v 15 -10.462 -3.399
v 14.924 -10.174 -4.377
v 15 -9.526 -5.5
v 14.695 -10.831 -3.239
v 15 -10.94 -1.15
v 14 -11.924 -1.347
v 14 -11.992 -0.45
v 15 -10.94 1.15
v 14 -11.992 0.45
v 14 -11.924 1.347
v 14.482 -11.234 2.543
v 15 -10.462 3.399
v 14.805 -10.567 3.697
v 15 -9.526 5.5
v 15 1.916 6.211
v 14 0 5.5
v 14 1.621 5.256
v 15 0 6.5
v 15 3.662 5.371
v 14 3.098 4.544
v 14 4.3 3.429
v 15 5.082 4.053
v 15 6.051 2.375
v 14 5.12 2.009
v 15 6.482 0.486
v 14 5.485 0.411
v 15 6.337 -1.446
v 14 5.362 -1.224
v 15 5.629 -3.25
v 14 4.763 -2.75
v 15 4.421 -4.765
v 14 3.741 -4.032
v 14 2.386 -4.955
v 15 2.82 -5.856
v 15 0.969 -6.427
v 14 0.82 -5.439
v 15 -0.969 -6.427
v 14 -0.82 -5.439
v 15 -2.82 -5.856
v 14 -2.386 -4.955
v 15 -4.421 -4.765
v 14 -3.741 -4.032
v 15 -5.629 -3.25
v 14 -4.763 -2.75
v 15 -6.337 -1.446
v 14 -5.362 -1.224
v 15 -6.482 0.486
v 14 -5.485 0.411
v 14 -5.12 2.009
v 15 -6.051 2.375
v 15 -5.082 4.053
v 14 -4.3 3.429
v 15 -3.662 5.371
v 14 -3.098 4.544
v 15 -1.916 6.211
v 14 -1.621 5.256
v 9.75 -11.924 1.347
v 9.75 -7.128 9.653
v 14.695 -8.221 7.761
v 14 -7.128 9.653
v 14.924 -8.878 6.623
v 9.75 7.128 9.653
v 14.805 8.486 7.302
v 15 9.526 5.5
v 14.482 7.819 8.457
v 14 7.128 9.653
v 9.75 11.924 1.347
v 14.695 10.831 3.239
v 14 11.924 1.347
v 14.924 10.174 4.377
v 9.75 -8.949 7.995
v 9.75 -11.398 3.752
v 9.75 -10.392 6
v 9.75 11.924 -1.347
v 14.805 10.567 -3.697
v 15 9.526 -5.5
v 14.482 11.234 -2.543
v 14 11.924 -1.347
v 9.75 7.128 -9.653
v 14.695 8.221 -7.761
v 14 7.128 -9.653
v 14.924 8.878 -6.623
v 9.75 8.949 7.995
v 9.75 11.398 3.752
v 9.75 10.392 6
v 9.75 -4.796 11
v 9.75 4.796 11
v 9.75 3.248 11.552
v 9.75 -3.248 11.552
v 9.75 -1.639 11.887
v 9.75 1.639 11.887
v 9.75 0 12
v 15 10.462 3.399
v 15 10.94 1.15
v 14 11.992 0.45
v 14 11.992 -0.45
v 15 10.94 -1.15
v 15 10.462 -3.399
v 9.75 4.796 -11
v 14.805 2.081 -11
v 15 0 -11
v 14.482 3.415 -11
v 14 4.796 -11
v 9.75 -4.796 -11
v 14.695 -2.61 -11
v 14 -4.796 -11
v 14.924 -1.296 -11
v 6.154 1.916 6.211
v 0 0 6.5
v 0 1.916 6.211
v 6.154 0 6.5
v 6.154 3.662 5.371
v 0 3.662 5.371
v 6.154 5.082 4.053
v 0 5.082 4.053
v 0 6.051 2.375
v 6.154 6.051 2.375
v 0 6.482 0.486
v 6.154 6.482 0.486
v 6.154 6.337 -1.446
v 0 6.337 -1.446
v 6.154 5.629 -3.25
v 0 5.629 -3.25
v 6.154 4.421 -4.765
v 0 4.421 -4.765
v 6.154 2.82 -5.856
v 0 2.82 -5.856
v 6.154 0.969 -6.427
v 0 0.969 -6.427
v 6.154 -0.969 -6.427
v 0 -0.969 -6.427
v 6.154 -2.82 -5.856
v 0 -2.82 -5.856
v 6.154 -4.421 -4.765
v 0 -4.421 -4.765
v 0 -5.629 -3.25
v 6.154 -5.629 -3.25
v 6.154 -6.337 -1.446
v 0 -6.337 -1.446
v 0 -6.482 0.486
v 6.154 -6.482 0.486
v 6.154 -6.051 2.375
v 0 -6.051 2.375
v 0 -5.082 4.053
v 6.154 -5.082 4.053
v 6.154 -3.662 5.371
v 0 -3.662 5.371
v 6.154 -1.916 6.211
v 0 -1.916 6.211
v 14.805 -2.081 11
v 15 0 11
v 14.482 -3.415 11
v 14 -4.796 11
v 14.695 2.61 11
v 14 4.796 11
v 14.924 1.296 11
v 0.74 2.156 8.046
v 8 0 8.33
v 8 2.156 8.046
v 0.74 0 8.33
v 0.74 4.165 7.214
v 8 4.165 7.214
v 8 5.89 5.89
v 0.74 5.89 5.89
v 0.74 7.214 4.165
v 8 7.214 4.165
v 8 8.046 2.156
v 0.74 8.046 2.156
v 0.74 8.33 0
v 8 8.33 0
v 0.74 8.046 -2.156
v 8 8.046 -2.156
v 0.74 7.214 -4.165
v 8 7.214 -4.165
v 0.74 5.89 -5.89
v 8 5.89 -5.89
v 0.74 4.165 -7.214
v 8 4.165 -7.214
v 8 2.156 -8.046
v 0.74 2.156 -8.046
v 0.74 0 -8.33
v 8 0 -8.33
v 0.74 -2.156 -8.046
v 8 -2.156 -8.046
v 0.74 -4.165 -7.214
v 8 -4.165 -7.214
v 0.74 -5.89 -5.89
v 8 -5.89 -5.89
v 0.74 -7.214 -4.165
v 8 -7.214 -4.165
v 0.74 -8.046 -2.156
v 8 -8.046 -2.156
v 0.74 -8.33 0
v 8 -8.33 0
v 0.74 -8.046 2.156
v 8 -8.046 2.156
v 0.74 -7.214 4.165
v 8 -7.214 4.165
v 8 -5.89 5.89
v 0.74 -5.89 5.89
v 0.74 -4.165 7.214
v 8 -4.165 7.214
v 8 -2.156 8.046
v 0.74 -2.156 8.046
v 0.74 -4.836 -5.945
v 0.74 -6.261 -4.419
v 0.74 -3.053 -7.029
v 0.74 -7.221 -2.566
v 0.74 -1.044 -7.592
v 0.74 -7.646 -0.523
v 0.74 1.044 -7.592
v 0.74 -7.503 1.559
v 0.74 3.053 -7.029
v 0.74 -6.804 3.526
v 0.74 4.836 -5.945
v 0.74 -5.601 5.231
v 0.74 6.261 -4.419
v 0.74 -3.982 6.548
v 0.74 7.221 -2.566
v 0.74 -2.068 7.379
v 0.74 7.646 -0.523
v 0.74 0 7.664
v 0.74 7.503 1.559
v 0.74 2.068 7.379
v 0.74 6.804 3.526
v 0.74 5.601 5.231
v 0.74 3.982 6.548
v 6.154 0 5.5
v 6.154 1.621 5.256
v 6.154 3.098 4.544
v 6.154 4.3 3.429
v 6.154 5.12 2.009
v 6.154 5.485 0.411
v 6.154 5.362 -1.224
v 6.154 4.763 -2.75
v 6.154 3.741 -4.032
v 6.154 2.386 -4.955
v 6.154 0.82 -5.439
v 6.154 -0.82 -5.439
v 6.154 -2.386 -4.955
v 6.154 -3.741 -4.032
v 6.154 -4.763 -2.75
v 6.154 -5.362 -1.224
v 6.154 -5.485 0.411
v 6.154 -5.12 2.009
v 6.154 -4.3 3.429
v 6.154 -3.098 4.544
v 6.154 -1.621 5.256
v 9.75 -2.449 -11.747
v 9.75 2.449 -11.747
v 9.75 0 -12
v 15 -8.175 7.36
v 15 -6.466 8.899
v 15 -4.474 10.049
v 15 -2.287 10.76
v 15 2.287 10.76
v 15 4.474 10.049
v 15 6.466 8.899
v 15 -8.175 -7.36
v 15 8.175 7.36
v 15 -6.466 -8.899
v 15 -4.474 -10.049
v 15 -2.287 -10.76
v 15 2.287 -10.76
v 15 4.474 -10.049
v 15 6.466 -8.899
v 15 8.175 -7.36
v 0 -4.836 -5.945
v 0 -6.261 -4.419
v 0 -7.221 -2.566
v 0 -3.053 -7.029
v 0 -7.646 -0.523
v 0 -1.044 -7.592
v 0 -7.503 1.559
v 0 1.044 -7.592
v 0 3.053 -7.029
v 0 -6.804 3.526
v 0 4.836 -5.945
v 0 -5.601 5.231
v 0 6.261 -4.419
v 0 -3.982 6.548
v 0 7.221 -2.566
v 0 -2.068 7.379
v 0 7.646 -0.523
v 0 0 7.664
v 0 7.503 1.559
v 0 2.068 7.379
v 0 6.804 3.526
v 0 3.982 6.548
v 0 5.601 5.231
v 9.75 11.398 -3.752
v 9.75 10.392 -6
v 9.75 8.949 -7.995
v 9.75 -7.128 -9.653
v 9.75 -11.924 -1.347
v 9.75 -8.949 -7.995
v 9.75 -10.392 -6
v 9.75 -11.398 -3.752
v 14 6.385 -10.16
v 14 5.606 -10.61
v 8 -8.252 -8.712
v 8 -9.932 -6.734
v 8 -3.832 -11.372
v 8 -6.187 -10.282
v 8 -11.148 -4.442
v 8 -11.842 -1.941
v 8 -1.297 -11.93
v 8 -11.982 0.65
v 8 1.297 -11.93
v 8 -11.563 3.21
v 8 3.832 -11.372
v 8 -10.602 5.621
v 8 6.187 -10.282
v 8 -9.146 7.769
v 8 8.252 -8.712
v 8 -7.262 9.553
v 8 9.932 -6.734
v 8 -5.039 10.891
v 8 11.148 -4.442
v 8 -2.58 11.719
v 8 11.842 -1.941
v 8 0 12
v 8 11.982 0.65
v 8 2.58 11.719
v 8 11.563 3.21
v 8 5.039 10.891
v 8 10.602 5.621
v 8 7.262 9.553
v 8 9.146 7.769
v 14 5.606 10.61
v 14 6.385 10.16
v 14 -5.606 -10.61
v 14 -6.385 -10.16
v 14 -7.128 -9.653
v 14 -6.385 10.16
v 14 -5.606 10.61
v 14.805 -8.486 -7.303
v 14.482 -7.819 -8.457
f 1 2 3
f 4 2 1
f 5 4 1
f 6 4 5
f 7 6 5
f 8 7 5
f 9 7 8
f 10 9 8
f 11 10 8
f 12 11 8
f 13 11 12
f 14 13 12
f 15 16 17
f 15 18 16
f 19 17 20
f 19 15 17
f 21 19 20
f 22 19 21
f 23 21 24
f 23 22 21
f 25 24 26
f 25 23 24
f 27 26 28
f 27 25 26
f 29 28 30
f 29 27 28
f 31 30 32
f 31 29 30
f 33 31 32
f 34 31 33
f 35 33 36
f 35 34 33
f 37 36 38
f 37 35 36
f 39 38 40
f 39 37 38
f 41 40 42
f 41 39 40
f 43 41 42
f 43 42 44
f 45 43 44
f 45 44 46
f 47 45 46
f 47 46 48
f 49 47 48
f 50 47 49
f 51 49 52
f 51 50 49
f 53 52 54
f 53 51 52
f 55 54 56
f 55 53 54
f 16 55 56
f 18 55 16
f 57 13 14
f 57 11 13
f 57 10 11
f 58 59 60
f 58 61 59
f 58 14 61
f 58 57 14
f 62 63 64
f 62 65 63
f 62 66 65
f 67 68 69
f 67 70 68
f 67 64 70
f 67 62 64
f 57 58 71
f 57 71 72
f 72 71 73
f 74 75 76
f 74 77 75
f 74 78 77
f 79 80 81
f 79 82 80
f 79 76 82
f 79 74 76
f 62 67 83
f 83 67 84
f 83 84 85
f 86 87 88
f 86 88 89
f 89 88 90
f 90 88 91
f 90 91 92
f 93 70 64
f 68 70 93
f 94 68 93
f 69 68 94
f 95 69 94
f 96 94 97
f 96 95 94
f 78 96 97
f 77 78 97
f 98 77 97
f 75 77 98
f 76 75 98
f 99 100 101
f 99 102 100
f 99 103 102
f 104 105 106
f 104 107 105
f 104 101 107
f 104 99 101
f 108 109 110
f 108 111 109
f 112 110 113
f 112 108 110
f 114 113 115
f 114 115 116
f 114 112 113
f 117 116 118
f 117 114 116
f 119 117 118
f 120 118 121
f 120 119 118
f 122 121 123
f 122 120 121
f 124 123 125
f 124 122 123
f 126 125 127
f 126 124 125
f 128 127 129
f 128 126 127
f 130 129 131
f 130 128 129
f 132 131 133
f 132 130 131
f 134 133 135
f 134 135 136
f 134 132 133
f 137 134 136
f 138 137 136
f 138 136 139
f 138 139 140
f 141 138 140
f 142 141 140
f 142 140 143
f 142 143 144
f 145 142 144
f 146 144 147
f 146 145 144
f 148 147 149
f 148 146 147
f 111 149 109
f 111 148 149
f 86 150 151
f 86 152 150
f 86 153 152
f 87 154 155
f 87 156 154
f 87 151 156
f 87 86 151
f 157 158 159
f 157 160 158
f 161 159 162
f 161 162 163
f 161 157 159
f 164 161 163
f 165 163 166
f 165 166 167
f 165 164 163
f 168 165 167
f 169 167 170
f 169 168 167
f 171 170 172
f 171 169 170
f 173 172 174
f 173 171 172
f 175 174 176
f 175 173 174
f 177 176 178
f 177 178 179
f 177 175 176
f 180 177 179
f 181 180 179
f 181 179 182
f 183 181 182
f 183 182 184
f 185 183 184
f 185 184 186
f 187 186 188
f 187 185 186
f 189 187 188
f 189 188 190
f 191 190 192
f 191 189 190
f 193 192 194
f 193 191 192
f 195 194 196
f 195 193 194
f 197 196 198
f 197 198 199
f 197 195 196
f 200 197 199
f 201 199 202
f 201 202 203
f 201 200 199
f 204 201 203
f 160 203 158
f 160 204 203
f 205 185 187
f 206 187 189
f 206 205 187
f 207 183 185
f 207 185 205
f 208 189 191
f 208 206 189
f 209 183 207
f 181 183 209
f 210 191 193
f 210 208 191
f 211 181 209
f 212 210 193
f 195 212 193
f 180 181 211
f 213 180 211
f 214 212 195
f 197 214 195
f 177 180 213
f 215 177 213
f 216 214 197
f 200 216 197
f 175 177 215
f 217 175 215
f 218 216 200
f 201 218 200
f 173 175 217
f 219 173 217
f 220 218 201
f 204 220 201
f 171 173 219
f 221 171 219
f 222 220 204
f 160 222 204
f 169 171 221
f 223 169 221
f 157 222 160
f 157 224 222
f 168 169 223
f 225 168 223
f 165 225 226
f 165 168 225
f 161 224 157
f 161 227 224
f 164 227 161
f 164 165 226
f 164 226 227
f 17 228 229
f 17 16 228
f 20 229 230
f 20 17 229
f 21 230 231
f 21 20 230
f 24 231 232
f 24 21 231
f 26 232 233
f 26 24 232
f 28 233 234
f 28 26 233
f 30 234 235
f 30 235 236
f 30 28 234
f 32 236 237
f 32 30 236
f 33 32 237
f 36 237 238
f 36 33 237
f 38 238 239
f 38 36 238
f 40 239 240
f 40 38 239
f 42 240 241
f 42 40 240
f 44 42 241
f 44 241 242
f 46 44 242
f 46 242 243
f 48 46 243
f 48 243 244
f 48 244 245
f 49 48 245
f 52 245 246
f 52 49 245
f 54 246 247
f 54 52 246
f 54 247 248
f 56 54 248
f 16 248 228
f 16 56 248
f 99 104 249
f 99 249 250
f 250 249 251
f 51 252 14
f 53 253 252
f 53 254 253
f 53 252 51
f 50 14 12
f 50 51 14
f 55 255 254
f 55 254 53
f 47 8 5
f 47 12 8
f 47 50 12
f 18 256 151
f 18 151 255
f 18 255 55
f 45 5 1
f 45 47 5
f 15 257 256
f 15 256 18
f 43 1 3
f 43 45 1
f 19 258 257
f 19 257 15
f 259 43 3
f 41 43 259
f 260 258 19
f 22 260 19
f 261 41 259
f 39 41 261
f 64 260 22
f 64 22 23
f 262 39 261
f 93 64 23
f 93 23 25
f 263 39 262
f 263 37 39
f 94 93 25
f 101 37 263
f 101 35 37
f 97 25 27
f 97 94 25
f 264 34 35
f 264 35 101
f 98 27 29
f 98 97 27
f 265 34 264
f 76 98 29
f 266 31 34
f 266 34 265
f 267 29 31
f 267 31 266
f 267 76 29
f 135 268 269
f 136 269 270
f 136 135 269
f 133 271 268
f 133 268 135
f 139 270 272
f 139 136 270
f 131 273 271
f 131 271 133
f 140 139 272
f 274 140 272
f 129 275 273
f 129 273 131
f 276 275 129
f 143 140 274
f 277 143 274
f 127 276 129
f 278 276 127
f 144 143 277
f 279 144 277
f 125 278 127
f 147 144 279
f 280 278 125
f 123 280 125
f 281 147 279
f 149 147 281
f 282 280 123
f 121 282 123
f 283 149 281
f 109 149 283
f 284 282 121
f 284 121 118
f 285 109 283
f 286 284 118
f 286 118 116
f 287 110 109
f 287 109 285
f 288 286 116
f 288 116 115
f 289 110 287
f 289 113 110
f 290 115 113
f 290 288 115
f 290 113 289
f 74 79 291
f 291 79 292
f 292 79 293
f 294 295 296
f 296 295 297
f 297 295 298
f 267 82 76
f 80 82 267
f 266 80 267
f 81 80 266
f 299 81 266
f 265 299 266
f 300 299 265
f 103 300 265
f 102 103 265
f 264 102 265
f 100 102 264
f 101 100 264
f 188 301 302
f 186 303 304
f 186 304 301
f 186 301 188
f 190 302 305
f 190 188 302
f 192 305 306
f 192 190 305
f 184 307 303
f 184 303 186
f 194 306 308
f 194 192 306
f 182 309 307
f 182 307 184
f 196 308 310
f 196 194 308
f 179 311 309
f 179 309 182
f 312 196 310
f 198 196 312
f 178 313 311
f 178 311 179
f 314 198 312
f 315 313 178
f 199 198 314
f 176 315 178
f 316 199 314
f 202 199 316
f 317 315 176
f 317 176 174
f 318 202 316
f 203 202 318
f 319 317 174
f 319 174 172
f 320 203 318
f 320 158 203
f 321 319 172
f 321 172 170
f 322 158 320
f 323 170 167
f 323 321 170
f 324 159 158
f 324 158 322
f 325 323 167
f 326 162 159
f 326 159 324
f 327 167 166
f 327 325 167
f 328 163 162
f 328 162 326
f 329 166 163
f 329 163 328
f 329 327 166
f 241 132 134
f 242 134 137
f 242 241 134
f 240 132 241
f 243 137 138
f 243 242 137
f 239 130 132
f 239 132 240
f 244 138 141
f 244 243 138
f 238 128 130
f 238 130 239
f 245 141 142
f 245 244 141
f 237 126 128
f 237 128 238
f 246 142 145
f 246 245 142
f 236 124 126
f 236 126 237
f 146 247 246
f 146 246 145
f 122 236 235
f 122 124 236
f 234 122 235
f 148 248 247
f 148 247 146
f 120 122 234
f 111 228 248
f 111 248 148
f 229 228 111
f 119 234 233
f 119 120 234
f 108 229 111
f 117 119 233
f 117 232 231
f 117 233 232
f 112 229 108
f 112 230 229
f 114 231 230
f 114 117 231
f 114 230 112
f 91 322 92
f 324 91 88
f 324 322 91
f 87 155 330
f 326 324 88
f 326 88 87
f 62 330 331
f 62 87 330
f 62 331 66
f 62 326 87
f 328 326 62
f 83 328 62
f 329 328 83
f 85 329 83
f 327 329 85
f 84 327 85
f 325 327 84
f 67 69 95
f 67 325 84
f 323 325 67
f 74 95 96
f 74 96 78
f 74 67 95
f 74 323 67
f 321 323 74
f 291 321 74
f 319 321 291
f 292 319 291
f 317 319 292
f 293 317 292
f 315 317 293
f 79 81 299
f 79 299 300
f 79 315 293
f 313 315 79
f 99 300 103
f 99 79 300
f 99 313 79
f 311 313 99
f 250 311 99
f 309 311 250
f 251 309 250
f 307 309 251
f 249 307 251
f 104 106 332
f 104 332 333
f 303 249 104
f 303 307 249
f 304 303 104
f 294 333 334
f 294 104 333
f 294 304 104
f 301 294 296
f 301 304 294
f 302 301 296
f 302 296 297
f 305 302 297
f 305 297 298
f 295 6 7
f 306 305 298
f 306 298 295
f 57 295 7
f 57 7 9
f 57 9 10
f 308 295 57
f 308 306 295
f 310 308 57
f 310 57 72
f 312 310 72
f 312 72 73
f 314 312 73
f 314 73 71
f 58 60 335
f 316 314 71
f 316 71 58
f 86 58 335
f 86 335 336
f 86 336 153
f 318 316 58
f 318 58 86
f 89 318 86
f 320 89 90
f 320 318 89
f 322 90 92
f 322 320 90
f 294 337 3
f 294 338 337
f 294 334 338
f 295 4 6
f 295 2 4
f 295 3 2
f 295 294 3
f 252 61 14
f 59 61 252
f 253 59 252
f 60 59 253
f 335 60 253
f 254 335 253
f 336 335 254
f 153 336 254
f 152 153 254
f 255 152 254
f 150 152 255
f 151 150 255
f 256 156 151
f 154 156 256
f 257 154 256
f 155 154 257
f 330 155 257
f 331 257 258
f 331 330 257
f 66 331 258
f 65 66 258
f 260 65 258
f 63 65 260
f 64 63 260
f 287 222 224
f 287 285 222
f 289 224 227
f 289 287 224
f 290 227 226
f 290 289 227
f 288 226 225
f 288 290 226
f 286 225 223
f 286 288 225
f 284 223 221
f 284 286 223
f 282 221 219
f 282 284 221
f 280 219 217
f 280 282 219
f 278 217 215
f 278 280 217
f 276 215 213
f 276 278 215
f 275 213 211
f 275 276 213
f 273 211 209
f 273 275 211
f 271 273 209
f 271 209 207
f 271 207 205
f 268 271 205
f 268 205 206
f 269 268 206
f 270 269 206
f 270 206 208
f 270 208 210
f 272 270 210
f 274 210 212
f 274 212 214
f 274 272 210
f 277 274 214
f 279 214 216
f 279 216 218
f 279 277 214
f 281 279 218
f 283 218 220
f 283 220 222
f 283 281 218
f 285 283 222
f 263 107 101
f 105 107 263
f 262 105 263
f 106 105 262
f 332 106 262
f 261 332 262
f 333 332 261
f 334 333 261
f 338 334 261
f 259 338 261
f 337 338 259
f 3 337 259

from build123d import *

# Parameters (mm, degrees)
TAGLIO_ESTRUSIONE1_DEPTH      = 5.25
TAGLIO_ESTRUSIONE1_DEPTH_BACK = 5.25
TAGLIO_ESTRUSIONE2_DEPTH      = 5.25
TAGLIO_ESTRUSIONE2_DEPTH_BACK = 5.25


with BuildPart() as part:
    # Schizzo1 → Rivoluzione1 (revolve)
    with BuildSketch(Plane.XY):
        Polygon((0, 6.5), (6.153846154, 6.5), (6.153846154, 5.5), (14, 5.5), (15, 6.5), (15, 11), (14, 12), (8, 12), (8, 8.33), (0.740444444, 8.33), (0.740444444, 7.6636), (0, 7.6636), align=None)
    revolve(axis=Axis((15, 0, 0), (-1, 0, 0)))

    # Schizzo2 → Taglio-Estrusione1 (cut, two sides: drawn at the far end of the back side and taken through both)
    with BuildSketch(Plane(origin=(15, 0, 0), x_dir=(0, 0, -1), z_dir=(1, 0, 0)).offset(-TAGLIO_ESTRUSIONE1_DEPTH_BACK)):
        Polygon((-16.5, -9.526279442), (1, -19.629909152), (1, -13.279056191), (-11, -6.350852961), (-11, 6.350852961), (1, 13.279056191), (1, 19.629909152), (-16.5, 9.526279442), align=None)
    extrude(amount=TAGLIO_ESTRUSIONE1_DEPTH + TAGLIO_ESTRUSIONE1_DEPTH_BACK, mode=Mode.SUBTRACT)

    # Schizzo3 → Taglio-Estrusione2 (cut, two sides: drawn at the far end of the back side and taken through both)
    with BuildSketch(Plane(origin=(15, 0, 0), x_dir=(0, 0, -1), z_dir=(1, 0, 0)).offset(-TAGLIO_ESTRUSIONE2_DEPTH_BACK)):
        Polygon((-1, -19.629909152), (16.5, -9.526279442), (16.5, 9.526279442), (-1, 19.629909152), (-1, 13.279056191), (11, 6.350852961), (11, -6.350852961), (-1, -13.279056191), align=None)
    extrude(amount=TAGLIO_ESTRUSIONE2_DEPTH + TAGLIO_ESTRUSIONE2_DEPTH_BACK, mode=Mode.SUBTRACT)


solid = part.part
